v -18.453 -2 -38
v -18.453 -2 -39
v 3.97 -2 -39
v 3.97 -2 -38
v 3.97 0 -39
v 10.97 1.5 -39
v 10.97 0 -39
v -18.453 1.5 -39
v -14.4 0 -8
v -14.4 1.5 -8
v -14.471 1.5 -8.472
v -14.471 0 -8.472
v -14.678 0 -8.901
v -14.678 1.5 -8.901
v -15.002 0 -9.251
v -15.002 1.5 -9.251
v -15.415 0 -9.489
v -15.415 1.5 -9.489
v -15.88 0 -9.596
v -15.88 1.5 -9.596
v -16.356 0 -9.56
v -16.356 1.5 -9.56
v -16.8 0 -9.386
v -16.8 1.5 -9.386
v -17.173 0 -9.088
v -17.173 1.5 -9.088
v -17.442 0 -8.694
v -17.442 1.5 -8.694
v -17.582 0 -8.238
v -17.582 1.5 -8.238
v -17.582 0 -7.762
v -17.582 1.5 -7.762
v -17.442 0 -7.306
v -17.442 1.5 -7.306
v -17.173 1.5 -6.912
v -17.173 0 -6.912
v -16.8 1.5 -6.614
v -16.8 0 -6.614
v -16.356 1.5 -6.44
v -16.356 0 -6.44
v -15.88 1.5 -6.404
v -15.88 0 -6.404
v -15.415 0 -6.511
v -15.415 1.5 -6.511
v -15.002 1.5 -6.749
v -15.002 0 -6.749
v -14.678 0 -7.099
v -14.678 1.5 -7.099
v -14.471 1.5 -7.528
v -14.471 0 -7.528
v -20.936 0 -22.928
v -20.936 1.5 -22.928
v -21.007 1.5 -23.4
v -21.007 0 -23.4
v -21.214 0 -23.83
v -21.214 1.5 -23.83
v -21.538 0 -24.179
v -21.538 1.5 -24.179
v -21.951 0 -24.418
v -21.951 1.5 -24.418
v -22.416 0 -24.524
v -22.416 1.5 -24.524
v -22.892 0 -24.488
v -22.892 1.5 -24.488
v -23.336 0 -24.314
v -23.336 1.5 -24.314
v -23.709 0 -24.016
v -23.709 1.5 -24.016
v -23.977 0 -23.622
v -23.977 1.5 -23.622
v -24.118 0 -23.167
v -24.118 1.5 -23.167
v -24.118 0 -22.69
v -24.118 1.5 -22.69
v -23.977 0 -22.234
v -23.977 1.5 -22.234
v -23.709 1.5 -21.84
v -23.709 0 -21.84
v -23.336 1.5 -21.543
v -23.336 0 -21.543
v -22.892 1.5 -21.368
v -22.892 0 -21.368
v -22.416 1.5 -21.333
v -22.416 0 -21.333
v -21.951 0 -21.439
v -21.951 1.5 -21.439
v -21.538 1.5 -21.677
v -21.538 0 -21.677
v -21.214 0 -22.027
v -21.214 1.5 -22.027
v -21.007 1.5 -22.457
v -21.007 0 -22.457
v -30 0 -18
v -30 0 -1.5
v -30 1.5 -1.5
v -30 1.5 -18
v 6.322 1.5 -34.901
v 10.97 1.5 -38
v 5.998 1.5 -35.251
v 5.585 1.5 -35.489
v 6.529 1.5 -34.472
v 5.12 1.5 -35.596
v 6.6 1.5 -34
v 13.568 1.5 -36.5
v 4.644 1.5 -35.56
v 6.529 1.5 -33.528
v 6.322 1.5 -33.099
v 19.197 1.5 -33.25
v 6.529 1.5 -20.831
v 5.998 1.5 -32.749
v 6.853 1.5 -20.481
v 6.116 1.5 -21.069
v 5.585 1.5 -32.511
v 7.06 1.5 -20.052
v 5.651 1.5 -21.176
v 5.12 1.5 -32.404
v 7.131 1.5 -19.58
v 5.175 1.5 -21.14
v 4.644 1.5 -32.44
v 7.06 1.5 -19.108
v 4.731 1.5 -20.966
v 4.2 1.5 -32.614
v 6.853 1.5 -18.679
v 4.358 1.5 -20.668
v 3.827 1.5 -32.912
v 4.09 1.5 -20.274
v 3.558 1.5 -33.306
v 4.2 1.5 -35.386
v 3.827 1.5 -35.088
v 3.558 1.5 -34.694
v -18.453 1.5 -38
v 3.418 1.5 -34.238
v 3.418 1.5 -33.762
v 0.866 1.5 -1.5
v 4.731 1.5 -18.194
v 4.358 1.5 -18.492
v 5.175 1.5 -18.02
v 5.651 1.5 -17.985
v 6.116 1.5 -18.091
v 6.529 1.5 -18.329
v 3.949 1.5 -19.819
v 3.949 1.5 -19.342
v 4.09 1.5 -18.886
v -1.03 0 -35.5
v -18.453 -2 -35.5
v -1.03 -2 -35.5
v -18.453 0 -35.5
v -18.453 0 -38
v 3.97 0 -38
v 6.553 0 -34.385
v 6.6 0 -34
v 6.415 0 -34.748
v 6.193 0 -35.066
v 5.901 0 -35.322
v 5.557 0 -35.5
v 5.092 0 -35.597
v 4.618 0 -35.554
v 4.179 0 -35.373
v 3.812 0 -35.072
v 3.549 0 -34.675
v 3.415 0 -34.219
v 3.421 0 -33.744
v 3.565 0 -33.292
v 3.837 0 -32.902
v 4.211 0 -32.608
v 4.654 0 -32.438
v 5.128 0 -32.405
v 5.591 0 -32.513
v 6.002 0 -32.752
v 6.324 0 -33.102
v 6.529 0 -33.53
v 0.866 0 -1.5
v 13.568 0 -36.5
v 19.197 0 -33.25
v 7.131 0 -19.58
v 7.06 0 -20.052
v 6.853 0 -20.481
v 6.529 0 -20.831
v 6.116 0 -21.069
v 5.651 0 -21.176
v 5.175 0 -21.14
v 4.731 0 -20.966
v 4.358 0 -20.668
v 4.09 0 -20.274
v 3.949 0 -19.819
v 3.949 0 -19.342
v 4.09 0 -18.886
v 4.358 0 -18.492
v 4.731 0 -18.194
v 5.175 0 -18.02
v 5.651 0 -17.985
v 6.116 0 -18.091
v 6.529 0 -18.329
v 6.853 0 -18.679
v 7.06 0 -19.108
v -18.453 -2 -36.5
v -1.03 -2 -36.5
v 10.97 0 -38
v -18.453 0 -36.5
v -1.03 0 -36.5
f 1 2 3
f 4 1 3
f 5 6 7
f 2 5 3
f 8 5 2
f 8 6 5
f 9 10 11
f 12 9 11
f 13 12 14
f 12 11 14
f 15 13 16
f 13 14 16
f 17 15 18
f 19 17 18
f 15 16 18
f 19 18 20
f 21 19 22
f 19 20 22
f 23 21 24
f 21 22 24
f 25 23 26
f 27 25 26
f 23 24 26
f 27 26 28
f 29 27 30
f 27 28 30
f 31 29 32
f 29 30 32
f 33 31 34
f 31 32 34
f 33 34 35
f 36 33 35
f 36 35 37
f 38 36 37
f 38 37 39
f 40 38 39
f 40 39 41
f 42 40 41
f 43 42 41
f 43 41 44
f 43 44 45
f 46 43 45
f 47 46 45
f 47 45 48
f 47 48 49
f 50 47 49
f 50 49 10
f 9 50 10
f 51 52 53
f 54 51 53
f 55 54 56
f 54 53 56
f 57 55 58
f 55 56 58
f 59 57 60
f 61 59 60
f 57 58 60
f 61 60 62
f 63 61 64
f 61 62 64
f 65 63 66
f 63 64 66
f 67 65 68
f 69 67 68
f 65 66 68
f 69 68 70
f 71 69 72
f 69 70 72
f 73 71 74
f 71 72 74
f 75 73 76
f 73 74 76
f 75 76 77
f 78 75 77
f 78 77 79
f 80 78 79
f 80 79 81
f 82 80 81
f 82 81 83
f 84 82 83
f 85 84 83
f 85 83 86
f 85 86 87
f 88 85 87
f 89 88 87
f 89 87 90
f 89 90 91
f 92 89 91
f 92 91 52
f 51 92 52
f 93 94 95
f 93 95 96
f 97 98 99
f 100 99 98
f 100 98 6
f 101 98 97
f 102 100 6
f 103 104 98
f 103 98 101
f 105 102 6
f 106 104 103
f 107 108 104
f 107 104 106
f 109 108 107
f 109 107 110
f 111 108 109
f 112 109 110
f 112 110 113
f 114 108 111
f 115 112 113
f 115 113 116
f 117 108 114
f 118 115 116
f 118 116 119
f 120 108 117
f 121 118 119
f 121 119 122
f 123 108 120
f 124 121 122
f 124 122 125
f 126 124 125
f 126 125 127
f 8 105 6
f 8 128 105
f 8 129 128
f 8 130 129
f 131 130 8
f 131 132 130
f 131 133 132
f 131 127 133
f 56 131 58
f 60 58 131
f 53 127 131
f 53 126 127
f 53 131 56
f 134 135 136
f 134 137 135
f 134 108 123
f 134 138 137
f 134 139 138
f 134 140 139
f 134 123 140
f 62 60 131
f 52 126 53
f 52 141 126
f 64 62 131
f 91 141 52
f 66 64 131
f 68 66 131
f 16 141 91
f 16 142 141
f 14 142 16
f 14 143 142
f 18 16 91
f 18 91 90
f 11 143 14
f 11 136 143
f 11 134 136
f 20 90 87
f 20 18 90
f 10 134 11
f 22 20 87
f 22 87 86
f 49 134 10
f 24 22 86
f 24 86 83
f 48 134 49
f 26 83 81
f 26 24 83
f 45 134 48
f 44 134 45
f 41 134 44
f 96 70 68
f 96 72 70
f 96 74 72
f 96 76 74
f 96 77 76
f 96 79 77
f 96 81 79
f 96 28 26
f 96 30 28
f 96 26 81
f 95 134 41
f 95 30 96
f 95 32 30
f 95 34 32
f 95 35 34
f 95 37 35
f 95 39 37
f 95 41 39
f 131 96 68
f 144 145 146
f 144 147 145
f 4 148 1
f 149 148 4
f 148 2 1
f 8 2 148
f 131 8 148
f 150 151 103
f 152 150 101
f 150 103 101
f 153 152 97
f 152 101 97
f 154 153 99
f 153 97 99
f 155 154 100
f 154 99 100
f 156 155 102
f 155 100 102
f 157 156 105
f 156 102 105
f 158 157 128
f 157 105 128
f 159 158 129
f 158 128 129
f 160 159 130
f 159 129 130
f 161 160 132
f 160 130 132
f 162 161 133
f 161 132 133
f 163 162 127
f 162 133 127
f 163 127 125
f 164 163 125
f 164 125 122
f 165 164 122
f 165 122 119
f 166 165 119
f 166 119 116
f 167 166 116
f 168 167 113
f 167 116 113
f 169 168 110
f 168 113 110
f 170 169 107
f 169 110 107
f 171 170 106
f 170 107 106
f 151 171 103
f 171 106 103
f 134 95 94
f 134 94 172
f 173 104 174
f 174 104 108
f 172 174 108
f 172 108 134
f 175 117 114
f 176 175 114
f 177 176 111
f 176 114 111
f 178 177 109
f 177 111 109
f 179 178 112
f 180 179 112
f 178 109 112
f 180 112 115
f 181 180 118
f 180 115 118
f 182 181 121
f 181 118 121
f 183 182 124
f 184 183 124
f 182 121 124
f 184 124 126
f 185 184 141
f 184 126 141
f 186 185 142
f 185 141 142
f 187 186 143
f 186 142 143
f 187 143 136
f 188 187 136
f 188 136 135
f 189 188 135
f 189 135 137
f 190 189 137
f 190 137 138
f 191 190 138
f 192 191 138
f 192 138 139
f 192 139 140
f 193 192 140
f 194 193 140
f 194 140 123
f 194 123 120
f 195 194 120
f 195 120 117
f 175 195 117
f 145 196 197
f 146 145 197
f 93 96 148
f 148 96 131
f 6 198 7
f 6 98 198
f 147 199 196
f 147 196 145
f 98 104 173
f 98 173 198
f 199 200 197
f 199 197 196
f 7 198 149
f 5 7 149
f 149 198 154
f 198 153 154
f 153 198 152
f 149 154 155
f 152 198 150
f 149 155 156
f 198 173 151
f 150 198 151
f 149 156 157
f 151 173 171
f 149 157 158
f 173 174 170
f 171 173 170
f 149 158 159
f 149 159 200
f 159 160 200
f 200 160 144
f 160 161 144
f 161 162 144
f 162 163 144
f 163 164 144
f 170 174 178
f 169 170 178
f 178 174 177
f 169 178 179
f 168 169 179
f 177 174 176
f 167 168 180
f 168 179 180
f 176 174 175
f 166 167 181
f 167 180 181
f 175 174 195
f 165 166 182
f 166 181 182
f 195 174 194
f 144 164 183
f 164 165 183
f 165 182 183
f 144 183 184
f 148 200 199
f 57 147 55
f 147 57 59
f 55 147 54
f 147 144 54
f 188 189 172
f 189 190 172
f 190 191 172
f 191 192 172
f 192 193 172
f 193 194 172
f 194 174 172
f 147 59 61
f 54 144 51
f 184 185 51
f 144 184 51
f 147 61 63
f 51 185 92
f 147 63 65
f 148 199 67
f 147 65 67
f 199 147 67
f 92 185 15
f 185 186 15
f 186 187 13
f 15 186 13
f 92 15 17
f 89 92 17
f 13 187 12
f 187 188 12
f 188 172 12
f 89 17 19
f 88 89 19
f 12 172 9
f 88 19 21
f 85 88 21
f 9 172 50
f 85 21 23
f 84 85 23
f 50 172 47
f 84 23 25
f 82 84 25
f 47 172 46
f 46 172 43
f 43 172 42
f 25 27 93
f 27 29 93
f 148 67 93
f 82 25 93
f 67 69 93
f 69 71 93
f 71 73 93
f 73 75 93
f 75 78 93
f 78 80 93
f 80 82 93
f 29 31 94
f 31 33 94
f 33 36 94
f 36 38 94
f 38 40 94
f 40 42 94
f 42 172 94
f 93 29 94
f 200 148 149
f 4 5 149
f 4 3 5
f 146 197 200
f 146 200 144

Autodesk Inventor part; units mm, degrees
ref_plane "YZ Plane" through (0, 0, 0) normal (1, 0, 0) x (0, 1, 0)
ref_plane "XZ Plane" through (0, 0, 0) normal (0, 1, 0) x (-1, 0, 0)
sketch "スケッチ1" plane through (0, 0, 0) normal (0, 1, 0) x (-1, 0, 0)
  line L0 (0, 0) -> (30, 0)
  line L1 (30, 0) -> (30, -135.2775)
  line L2 (30, -135.2775) -> (-78.1025, -135.2775)
  line L3 (-78.1025, -135.2775) -> (0, 0)
  dimension "d0" = 30
  dimension "d1" = 60
extrude "押し出し1" add sketch "スケッチ1" along normal blind 1.5
sketch "スケッチ2" plane through (0, 1.5, 0) normal (0, 1, 0) x (1, 0, 0)
  line L0 (-25, 8) -> (-25, 1.5) projected
  line L1 (-21.9199, 13.3349) -> (-25, 8) projected
  line L2 (-30, 18) -> (-21.9199, 13.3349) projected
  line L3 (-24.2265, 28) -> (-30, 18) projected
  line L4 (0, 28) -> (-24.2265, 28) projected
  line L5 (10.9697, 38) -> (0, 38) projected
  line L6 (13.5677, 36.5) -> (10.9697, 38) projected
  line L7 (11.0677, 32.1699) -> (13.5677, 36.5) projected
  line L8 (16.6969, 28.9199) -> (11.0677, 32.1699) projected
  line L9 (7.3612, 12.75) -> (16.6969, 28.9199) projected
  line L10 (0, 17) -> (7.3612, 12.75) projected
  line L11 (-12, 17) -> (0, 17) projected
  line L12 (-12, 8) -> (-12, 17) projected
  line L13 (-5, 8) -> (-12, 8) projected
  line L14 (-5, 1.5) -> (-5, 8) projected
  line L15 (-25, 1.5) -> (-5, 1.5) projected
  line L16 (78.1025, 135.2775) -> (-30, 135.2775) projected
  line L17 (-30, 135.2775) -> (-30, 0) projected
  line L18 (-30, 0) -> (0, 0) projected
  line L19 (0, 0) -> (78.1025, 135.2775) projected
  line L20 (-24.2265, 28) -> (-18.453, 38)
  line L21 (-18.453, 38) -> (5, 38)
  line L22 (13.5677, 36.5) -> (19.1969, 33.25)
  line L23 (0, 28) -> (0, 38) projected
  circle A0 centre (5, 34) radius 2.5 projected
  circle A1 centre (5.5311, 19.5801) radius 1.35 projected
  circle A2 centre (-16, 8) radius 1.35 projected
  circle A3 centre (-22.5359, 22.9282) radius 1.35 projected
  circle A4 centre (-6, 23) radius 1.35 projected
  line L24 (-30, 1.5) -> (-25, 1.5)
  line L25 (-5, 1.5) -> (0.866, 1.5)
  point P0 (0, 36.5)
  point P1 (5, 36.5)
extrude "押し出し2" cut sketch "スケッチ2" against normal through all contours L15 L25 L19 L18 L17 L24 | L17 L16 L19 L22 L6 L5 L21 L20 L3
sketch "スケッチ3" plane through (0, 1.5, 0) normal (0, 1, 0) x (1, 0, 0)
  line L0 (-18.453, 38) -> (10.9697, 38) projected
  line L1 (5, 36.5) -> (-17, 36.5) projected
  line L2 (10.9697, 39) -> (-18.453, 39)
  line L3 (-18.453, 39) -> (-18.453, 35.5)
  line L4 (-18.453, 35.5) -> (10.9697, 35.5)
  line L5 (10.9697, 35.5) -> (10.9697, 39)
  line L6 (5, 36.5) -> (10.9697, 36.5)
  line L7 (-17, 36.5) -> (-18.453, 36.5)
  point P0 (0, 0)
  dimension "d6" = 1
  dimension "d7" = 1
extrude "押し出し3" add sketch "スケッチ3" against normal blind 3.5 contours L3 L2 L5 L0 | L7 L1 L6 L5 L4 L3
sketch "スケッチ4" plane through (0, 1.5, 0) normal (0, 1, 0) x (1, 0, 0)
  circle A0 centre (-16, 8) radius 1.6
  circle A1 centre (-22.5359, 22.9282) radius 1.6
  circle A2 centre (5.5311, 19.5801) radius 1.6
  circle A3 centre (5, 34) radius 1.6
  line L0 (0, 36.5) -> (0, 17) projected
  line L1 (-12, 8) -> (-12, 28) projected
  line L2 (-18.453, 38) -> (-30, 18) projected
  line L3 (-30, 18) -> (-21.9199, 13.3349) projected
  line L4 (0, 17) -> (7.3612, 12.75) projected
  line L5 (0.866, 1.5) -> (19.1969, 33.25) projected
  line L6 (10.9697, 39) -> (-18.453, 39) projected
  circle A4 centre (5, 34) radius 2.5 projected
  point P0 (0, 0)
  point P1 (16.6969, 28.9199)
  dimension "d10" = 3.2
  dimension "d11" = 3.2
  dimension "d12" = 3.2
  dimension "d13" = 3.2
  dimension "d14" = 4
  dimension "d15" = 4
  dimension "d16" = 8
  dimension "d17" = 5
  dimension "d18" = 5
extrude "押し出し4" cut sketch "スケッチ4" against normal through all contours A0 | A1 | A2 | A3
sketch "スケッチ5" plane through (0, -2, 0) normal (0, -1, 0) x (1, 0, 0)
  line L0 (10.9697, -39) -> (3.9697, -39)
  line L1 (3.9697, -39) -> (3.9697, -35.5)
  line L2 (3.9697, -35.5) -> (10.9697, -35.5)
  line L3 (10.9697, -35.5) -> (10.9697, -39)
  line L4 (10.9697, -35.5) -> (5.5568, -35.5) projected
  point P0 (0, 0)
  dimension "d23" = 7
extrude "押し出し5" cut sketch "スケッチ5" against normal up to surface (2 mm away)
sketch "スケッチ6" plane through (0, -2, 0) normal (0, -1, 0) x (1, 0, 0)
  line L0 (-18.453, -36.5) -> (3.9697, -36.5) projected
  line L1 (3.9697, -36.5) -> (3.9697, -35.5) projected
  line L2 (3.9697, -35.5) -> (-18.453, -35.5) projected
  line L3 (-1.0303, -36.5) -> (-1.0303, -35.5)
  point P0 (0, 0)
  dimension "d26" = 5
ref_plane "作業平面1" through (0, 0, -38) normal (0, 1, 0) x (0, 0, 1)
extrude "押し出し6" cut sketch "スケッチ6" against normal up to surface (2 mm away)
properties part number "rail_cover_upper"
